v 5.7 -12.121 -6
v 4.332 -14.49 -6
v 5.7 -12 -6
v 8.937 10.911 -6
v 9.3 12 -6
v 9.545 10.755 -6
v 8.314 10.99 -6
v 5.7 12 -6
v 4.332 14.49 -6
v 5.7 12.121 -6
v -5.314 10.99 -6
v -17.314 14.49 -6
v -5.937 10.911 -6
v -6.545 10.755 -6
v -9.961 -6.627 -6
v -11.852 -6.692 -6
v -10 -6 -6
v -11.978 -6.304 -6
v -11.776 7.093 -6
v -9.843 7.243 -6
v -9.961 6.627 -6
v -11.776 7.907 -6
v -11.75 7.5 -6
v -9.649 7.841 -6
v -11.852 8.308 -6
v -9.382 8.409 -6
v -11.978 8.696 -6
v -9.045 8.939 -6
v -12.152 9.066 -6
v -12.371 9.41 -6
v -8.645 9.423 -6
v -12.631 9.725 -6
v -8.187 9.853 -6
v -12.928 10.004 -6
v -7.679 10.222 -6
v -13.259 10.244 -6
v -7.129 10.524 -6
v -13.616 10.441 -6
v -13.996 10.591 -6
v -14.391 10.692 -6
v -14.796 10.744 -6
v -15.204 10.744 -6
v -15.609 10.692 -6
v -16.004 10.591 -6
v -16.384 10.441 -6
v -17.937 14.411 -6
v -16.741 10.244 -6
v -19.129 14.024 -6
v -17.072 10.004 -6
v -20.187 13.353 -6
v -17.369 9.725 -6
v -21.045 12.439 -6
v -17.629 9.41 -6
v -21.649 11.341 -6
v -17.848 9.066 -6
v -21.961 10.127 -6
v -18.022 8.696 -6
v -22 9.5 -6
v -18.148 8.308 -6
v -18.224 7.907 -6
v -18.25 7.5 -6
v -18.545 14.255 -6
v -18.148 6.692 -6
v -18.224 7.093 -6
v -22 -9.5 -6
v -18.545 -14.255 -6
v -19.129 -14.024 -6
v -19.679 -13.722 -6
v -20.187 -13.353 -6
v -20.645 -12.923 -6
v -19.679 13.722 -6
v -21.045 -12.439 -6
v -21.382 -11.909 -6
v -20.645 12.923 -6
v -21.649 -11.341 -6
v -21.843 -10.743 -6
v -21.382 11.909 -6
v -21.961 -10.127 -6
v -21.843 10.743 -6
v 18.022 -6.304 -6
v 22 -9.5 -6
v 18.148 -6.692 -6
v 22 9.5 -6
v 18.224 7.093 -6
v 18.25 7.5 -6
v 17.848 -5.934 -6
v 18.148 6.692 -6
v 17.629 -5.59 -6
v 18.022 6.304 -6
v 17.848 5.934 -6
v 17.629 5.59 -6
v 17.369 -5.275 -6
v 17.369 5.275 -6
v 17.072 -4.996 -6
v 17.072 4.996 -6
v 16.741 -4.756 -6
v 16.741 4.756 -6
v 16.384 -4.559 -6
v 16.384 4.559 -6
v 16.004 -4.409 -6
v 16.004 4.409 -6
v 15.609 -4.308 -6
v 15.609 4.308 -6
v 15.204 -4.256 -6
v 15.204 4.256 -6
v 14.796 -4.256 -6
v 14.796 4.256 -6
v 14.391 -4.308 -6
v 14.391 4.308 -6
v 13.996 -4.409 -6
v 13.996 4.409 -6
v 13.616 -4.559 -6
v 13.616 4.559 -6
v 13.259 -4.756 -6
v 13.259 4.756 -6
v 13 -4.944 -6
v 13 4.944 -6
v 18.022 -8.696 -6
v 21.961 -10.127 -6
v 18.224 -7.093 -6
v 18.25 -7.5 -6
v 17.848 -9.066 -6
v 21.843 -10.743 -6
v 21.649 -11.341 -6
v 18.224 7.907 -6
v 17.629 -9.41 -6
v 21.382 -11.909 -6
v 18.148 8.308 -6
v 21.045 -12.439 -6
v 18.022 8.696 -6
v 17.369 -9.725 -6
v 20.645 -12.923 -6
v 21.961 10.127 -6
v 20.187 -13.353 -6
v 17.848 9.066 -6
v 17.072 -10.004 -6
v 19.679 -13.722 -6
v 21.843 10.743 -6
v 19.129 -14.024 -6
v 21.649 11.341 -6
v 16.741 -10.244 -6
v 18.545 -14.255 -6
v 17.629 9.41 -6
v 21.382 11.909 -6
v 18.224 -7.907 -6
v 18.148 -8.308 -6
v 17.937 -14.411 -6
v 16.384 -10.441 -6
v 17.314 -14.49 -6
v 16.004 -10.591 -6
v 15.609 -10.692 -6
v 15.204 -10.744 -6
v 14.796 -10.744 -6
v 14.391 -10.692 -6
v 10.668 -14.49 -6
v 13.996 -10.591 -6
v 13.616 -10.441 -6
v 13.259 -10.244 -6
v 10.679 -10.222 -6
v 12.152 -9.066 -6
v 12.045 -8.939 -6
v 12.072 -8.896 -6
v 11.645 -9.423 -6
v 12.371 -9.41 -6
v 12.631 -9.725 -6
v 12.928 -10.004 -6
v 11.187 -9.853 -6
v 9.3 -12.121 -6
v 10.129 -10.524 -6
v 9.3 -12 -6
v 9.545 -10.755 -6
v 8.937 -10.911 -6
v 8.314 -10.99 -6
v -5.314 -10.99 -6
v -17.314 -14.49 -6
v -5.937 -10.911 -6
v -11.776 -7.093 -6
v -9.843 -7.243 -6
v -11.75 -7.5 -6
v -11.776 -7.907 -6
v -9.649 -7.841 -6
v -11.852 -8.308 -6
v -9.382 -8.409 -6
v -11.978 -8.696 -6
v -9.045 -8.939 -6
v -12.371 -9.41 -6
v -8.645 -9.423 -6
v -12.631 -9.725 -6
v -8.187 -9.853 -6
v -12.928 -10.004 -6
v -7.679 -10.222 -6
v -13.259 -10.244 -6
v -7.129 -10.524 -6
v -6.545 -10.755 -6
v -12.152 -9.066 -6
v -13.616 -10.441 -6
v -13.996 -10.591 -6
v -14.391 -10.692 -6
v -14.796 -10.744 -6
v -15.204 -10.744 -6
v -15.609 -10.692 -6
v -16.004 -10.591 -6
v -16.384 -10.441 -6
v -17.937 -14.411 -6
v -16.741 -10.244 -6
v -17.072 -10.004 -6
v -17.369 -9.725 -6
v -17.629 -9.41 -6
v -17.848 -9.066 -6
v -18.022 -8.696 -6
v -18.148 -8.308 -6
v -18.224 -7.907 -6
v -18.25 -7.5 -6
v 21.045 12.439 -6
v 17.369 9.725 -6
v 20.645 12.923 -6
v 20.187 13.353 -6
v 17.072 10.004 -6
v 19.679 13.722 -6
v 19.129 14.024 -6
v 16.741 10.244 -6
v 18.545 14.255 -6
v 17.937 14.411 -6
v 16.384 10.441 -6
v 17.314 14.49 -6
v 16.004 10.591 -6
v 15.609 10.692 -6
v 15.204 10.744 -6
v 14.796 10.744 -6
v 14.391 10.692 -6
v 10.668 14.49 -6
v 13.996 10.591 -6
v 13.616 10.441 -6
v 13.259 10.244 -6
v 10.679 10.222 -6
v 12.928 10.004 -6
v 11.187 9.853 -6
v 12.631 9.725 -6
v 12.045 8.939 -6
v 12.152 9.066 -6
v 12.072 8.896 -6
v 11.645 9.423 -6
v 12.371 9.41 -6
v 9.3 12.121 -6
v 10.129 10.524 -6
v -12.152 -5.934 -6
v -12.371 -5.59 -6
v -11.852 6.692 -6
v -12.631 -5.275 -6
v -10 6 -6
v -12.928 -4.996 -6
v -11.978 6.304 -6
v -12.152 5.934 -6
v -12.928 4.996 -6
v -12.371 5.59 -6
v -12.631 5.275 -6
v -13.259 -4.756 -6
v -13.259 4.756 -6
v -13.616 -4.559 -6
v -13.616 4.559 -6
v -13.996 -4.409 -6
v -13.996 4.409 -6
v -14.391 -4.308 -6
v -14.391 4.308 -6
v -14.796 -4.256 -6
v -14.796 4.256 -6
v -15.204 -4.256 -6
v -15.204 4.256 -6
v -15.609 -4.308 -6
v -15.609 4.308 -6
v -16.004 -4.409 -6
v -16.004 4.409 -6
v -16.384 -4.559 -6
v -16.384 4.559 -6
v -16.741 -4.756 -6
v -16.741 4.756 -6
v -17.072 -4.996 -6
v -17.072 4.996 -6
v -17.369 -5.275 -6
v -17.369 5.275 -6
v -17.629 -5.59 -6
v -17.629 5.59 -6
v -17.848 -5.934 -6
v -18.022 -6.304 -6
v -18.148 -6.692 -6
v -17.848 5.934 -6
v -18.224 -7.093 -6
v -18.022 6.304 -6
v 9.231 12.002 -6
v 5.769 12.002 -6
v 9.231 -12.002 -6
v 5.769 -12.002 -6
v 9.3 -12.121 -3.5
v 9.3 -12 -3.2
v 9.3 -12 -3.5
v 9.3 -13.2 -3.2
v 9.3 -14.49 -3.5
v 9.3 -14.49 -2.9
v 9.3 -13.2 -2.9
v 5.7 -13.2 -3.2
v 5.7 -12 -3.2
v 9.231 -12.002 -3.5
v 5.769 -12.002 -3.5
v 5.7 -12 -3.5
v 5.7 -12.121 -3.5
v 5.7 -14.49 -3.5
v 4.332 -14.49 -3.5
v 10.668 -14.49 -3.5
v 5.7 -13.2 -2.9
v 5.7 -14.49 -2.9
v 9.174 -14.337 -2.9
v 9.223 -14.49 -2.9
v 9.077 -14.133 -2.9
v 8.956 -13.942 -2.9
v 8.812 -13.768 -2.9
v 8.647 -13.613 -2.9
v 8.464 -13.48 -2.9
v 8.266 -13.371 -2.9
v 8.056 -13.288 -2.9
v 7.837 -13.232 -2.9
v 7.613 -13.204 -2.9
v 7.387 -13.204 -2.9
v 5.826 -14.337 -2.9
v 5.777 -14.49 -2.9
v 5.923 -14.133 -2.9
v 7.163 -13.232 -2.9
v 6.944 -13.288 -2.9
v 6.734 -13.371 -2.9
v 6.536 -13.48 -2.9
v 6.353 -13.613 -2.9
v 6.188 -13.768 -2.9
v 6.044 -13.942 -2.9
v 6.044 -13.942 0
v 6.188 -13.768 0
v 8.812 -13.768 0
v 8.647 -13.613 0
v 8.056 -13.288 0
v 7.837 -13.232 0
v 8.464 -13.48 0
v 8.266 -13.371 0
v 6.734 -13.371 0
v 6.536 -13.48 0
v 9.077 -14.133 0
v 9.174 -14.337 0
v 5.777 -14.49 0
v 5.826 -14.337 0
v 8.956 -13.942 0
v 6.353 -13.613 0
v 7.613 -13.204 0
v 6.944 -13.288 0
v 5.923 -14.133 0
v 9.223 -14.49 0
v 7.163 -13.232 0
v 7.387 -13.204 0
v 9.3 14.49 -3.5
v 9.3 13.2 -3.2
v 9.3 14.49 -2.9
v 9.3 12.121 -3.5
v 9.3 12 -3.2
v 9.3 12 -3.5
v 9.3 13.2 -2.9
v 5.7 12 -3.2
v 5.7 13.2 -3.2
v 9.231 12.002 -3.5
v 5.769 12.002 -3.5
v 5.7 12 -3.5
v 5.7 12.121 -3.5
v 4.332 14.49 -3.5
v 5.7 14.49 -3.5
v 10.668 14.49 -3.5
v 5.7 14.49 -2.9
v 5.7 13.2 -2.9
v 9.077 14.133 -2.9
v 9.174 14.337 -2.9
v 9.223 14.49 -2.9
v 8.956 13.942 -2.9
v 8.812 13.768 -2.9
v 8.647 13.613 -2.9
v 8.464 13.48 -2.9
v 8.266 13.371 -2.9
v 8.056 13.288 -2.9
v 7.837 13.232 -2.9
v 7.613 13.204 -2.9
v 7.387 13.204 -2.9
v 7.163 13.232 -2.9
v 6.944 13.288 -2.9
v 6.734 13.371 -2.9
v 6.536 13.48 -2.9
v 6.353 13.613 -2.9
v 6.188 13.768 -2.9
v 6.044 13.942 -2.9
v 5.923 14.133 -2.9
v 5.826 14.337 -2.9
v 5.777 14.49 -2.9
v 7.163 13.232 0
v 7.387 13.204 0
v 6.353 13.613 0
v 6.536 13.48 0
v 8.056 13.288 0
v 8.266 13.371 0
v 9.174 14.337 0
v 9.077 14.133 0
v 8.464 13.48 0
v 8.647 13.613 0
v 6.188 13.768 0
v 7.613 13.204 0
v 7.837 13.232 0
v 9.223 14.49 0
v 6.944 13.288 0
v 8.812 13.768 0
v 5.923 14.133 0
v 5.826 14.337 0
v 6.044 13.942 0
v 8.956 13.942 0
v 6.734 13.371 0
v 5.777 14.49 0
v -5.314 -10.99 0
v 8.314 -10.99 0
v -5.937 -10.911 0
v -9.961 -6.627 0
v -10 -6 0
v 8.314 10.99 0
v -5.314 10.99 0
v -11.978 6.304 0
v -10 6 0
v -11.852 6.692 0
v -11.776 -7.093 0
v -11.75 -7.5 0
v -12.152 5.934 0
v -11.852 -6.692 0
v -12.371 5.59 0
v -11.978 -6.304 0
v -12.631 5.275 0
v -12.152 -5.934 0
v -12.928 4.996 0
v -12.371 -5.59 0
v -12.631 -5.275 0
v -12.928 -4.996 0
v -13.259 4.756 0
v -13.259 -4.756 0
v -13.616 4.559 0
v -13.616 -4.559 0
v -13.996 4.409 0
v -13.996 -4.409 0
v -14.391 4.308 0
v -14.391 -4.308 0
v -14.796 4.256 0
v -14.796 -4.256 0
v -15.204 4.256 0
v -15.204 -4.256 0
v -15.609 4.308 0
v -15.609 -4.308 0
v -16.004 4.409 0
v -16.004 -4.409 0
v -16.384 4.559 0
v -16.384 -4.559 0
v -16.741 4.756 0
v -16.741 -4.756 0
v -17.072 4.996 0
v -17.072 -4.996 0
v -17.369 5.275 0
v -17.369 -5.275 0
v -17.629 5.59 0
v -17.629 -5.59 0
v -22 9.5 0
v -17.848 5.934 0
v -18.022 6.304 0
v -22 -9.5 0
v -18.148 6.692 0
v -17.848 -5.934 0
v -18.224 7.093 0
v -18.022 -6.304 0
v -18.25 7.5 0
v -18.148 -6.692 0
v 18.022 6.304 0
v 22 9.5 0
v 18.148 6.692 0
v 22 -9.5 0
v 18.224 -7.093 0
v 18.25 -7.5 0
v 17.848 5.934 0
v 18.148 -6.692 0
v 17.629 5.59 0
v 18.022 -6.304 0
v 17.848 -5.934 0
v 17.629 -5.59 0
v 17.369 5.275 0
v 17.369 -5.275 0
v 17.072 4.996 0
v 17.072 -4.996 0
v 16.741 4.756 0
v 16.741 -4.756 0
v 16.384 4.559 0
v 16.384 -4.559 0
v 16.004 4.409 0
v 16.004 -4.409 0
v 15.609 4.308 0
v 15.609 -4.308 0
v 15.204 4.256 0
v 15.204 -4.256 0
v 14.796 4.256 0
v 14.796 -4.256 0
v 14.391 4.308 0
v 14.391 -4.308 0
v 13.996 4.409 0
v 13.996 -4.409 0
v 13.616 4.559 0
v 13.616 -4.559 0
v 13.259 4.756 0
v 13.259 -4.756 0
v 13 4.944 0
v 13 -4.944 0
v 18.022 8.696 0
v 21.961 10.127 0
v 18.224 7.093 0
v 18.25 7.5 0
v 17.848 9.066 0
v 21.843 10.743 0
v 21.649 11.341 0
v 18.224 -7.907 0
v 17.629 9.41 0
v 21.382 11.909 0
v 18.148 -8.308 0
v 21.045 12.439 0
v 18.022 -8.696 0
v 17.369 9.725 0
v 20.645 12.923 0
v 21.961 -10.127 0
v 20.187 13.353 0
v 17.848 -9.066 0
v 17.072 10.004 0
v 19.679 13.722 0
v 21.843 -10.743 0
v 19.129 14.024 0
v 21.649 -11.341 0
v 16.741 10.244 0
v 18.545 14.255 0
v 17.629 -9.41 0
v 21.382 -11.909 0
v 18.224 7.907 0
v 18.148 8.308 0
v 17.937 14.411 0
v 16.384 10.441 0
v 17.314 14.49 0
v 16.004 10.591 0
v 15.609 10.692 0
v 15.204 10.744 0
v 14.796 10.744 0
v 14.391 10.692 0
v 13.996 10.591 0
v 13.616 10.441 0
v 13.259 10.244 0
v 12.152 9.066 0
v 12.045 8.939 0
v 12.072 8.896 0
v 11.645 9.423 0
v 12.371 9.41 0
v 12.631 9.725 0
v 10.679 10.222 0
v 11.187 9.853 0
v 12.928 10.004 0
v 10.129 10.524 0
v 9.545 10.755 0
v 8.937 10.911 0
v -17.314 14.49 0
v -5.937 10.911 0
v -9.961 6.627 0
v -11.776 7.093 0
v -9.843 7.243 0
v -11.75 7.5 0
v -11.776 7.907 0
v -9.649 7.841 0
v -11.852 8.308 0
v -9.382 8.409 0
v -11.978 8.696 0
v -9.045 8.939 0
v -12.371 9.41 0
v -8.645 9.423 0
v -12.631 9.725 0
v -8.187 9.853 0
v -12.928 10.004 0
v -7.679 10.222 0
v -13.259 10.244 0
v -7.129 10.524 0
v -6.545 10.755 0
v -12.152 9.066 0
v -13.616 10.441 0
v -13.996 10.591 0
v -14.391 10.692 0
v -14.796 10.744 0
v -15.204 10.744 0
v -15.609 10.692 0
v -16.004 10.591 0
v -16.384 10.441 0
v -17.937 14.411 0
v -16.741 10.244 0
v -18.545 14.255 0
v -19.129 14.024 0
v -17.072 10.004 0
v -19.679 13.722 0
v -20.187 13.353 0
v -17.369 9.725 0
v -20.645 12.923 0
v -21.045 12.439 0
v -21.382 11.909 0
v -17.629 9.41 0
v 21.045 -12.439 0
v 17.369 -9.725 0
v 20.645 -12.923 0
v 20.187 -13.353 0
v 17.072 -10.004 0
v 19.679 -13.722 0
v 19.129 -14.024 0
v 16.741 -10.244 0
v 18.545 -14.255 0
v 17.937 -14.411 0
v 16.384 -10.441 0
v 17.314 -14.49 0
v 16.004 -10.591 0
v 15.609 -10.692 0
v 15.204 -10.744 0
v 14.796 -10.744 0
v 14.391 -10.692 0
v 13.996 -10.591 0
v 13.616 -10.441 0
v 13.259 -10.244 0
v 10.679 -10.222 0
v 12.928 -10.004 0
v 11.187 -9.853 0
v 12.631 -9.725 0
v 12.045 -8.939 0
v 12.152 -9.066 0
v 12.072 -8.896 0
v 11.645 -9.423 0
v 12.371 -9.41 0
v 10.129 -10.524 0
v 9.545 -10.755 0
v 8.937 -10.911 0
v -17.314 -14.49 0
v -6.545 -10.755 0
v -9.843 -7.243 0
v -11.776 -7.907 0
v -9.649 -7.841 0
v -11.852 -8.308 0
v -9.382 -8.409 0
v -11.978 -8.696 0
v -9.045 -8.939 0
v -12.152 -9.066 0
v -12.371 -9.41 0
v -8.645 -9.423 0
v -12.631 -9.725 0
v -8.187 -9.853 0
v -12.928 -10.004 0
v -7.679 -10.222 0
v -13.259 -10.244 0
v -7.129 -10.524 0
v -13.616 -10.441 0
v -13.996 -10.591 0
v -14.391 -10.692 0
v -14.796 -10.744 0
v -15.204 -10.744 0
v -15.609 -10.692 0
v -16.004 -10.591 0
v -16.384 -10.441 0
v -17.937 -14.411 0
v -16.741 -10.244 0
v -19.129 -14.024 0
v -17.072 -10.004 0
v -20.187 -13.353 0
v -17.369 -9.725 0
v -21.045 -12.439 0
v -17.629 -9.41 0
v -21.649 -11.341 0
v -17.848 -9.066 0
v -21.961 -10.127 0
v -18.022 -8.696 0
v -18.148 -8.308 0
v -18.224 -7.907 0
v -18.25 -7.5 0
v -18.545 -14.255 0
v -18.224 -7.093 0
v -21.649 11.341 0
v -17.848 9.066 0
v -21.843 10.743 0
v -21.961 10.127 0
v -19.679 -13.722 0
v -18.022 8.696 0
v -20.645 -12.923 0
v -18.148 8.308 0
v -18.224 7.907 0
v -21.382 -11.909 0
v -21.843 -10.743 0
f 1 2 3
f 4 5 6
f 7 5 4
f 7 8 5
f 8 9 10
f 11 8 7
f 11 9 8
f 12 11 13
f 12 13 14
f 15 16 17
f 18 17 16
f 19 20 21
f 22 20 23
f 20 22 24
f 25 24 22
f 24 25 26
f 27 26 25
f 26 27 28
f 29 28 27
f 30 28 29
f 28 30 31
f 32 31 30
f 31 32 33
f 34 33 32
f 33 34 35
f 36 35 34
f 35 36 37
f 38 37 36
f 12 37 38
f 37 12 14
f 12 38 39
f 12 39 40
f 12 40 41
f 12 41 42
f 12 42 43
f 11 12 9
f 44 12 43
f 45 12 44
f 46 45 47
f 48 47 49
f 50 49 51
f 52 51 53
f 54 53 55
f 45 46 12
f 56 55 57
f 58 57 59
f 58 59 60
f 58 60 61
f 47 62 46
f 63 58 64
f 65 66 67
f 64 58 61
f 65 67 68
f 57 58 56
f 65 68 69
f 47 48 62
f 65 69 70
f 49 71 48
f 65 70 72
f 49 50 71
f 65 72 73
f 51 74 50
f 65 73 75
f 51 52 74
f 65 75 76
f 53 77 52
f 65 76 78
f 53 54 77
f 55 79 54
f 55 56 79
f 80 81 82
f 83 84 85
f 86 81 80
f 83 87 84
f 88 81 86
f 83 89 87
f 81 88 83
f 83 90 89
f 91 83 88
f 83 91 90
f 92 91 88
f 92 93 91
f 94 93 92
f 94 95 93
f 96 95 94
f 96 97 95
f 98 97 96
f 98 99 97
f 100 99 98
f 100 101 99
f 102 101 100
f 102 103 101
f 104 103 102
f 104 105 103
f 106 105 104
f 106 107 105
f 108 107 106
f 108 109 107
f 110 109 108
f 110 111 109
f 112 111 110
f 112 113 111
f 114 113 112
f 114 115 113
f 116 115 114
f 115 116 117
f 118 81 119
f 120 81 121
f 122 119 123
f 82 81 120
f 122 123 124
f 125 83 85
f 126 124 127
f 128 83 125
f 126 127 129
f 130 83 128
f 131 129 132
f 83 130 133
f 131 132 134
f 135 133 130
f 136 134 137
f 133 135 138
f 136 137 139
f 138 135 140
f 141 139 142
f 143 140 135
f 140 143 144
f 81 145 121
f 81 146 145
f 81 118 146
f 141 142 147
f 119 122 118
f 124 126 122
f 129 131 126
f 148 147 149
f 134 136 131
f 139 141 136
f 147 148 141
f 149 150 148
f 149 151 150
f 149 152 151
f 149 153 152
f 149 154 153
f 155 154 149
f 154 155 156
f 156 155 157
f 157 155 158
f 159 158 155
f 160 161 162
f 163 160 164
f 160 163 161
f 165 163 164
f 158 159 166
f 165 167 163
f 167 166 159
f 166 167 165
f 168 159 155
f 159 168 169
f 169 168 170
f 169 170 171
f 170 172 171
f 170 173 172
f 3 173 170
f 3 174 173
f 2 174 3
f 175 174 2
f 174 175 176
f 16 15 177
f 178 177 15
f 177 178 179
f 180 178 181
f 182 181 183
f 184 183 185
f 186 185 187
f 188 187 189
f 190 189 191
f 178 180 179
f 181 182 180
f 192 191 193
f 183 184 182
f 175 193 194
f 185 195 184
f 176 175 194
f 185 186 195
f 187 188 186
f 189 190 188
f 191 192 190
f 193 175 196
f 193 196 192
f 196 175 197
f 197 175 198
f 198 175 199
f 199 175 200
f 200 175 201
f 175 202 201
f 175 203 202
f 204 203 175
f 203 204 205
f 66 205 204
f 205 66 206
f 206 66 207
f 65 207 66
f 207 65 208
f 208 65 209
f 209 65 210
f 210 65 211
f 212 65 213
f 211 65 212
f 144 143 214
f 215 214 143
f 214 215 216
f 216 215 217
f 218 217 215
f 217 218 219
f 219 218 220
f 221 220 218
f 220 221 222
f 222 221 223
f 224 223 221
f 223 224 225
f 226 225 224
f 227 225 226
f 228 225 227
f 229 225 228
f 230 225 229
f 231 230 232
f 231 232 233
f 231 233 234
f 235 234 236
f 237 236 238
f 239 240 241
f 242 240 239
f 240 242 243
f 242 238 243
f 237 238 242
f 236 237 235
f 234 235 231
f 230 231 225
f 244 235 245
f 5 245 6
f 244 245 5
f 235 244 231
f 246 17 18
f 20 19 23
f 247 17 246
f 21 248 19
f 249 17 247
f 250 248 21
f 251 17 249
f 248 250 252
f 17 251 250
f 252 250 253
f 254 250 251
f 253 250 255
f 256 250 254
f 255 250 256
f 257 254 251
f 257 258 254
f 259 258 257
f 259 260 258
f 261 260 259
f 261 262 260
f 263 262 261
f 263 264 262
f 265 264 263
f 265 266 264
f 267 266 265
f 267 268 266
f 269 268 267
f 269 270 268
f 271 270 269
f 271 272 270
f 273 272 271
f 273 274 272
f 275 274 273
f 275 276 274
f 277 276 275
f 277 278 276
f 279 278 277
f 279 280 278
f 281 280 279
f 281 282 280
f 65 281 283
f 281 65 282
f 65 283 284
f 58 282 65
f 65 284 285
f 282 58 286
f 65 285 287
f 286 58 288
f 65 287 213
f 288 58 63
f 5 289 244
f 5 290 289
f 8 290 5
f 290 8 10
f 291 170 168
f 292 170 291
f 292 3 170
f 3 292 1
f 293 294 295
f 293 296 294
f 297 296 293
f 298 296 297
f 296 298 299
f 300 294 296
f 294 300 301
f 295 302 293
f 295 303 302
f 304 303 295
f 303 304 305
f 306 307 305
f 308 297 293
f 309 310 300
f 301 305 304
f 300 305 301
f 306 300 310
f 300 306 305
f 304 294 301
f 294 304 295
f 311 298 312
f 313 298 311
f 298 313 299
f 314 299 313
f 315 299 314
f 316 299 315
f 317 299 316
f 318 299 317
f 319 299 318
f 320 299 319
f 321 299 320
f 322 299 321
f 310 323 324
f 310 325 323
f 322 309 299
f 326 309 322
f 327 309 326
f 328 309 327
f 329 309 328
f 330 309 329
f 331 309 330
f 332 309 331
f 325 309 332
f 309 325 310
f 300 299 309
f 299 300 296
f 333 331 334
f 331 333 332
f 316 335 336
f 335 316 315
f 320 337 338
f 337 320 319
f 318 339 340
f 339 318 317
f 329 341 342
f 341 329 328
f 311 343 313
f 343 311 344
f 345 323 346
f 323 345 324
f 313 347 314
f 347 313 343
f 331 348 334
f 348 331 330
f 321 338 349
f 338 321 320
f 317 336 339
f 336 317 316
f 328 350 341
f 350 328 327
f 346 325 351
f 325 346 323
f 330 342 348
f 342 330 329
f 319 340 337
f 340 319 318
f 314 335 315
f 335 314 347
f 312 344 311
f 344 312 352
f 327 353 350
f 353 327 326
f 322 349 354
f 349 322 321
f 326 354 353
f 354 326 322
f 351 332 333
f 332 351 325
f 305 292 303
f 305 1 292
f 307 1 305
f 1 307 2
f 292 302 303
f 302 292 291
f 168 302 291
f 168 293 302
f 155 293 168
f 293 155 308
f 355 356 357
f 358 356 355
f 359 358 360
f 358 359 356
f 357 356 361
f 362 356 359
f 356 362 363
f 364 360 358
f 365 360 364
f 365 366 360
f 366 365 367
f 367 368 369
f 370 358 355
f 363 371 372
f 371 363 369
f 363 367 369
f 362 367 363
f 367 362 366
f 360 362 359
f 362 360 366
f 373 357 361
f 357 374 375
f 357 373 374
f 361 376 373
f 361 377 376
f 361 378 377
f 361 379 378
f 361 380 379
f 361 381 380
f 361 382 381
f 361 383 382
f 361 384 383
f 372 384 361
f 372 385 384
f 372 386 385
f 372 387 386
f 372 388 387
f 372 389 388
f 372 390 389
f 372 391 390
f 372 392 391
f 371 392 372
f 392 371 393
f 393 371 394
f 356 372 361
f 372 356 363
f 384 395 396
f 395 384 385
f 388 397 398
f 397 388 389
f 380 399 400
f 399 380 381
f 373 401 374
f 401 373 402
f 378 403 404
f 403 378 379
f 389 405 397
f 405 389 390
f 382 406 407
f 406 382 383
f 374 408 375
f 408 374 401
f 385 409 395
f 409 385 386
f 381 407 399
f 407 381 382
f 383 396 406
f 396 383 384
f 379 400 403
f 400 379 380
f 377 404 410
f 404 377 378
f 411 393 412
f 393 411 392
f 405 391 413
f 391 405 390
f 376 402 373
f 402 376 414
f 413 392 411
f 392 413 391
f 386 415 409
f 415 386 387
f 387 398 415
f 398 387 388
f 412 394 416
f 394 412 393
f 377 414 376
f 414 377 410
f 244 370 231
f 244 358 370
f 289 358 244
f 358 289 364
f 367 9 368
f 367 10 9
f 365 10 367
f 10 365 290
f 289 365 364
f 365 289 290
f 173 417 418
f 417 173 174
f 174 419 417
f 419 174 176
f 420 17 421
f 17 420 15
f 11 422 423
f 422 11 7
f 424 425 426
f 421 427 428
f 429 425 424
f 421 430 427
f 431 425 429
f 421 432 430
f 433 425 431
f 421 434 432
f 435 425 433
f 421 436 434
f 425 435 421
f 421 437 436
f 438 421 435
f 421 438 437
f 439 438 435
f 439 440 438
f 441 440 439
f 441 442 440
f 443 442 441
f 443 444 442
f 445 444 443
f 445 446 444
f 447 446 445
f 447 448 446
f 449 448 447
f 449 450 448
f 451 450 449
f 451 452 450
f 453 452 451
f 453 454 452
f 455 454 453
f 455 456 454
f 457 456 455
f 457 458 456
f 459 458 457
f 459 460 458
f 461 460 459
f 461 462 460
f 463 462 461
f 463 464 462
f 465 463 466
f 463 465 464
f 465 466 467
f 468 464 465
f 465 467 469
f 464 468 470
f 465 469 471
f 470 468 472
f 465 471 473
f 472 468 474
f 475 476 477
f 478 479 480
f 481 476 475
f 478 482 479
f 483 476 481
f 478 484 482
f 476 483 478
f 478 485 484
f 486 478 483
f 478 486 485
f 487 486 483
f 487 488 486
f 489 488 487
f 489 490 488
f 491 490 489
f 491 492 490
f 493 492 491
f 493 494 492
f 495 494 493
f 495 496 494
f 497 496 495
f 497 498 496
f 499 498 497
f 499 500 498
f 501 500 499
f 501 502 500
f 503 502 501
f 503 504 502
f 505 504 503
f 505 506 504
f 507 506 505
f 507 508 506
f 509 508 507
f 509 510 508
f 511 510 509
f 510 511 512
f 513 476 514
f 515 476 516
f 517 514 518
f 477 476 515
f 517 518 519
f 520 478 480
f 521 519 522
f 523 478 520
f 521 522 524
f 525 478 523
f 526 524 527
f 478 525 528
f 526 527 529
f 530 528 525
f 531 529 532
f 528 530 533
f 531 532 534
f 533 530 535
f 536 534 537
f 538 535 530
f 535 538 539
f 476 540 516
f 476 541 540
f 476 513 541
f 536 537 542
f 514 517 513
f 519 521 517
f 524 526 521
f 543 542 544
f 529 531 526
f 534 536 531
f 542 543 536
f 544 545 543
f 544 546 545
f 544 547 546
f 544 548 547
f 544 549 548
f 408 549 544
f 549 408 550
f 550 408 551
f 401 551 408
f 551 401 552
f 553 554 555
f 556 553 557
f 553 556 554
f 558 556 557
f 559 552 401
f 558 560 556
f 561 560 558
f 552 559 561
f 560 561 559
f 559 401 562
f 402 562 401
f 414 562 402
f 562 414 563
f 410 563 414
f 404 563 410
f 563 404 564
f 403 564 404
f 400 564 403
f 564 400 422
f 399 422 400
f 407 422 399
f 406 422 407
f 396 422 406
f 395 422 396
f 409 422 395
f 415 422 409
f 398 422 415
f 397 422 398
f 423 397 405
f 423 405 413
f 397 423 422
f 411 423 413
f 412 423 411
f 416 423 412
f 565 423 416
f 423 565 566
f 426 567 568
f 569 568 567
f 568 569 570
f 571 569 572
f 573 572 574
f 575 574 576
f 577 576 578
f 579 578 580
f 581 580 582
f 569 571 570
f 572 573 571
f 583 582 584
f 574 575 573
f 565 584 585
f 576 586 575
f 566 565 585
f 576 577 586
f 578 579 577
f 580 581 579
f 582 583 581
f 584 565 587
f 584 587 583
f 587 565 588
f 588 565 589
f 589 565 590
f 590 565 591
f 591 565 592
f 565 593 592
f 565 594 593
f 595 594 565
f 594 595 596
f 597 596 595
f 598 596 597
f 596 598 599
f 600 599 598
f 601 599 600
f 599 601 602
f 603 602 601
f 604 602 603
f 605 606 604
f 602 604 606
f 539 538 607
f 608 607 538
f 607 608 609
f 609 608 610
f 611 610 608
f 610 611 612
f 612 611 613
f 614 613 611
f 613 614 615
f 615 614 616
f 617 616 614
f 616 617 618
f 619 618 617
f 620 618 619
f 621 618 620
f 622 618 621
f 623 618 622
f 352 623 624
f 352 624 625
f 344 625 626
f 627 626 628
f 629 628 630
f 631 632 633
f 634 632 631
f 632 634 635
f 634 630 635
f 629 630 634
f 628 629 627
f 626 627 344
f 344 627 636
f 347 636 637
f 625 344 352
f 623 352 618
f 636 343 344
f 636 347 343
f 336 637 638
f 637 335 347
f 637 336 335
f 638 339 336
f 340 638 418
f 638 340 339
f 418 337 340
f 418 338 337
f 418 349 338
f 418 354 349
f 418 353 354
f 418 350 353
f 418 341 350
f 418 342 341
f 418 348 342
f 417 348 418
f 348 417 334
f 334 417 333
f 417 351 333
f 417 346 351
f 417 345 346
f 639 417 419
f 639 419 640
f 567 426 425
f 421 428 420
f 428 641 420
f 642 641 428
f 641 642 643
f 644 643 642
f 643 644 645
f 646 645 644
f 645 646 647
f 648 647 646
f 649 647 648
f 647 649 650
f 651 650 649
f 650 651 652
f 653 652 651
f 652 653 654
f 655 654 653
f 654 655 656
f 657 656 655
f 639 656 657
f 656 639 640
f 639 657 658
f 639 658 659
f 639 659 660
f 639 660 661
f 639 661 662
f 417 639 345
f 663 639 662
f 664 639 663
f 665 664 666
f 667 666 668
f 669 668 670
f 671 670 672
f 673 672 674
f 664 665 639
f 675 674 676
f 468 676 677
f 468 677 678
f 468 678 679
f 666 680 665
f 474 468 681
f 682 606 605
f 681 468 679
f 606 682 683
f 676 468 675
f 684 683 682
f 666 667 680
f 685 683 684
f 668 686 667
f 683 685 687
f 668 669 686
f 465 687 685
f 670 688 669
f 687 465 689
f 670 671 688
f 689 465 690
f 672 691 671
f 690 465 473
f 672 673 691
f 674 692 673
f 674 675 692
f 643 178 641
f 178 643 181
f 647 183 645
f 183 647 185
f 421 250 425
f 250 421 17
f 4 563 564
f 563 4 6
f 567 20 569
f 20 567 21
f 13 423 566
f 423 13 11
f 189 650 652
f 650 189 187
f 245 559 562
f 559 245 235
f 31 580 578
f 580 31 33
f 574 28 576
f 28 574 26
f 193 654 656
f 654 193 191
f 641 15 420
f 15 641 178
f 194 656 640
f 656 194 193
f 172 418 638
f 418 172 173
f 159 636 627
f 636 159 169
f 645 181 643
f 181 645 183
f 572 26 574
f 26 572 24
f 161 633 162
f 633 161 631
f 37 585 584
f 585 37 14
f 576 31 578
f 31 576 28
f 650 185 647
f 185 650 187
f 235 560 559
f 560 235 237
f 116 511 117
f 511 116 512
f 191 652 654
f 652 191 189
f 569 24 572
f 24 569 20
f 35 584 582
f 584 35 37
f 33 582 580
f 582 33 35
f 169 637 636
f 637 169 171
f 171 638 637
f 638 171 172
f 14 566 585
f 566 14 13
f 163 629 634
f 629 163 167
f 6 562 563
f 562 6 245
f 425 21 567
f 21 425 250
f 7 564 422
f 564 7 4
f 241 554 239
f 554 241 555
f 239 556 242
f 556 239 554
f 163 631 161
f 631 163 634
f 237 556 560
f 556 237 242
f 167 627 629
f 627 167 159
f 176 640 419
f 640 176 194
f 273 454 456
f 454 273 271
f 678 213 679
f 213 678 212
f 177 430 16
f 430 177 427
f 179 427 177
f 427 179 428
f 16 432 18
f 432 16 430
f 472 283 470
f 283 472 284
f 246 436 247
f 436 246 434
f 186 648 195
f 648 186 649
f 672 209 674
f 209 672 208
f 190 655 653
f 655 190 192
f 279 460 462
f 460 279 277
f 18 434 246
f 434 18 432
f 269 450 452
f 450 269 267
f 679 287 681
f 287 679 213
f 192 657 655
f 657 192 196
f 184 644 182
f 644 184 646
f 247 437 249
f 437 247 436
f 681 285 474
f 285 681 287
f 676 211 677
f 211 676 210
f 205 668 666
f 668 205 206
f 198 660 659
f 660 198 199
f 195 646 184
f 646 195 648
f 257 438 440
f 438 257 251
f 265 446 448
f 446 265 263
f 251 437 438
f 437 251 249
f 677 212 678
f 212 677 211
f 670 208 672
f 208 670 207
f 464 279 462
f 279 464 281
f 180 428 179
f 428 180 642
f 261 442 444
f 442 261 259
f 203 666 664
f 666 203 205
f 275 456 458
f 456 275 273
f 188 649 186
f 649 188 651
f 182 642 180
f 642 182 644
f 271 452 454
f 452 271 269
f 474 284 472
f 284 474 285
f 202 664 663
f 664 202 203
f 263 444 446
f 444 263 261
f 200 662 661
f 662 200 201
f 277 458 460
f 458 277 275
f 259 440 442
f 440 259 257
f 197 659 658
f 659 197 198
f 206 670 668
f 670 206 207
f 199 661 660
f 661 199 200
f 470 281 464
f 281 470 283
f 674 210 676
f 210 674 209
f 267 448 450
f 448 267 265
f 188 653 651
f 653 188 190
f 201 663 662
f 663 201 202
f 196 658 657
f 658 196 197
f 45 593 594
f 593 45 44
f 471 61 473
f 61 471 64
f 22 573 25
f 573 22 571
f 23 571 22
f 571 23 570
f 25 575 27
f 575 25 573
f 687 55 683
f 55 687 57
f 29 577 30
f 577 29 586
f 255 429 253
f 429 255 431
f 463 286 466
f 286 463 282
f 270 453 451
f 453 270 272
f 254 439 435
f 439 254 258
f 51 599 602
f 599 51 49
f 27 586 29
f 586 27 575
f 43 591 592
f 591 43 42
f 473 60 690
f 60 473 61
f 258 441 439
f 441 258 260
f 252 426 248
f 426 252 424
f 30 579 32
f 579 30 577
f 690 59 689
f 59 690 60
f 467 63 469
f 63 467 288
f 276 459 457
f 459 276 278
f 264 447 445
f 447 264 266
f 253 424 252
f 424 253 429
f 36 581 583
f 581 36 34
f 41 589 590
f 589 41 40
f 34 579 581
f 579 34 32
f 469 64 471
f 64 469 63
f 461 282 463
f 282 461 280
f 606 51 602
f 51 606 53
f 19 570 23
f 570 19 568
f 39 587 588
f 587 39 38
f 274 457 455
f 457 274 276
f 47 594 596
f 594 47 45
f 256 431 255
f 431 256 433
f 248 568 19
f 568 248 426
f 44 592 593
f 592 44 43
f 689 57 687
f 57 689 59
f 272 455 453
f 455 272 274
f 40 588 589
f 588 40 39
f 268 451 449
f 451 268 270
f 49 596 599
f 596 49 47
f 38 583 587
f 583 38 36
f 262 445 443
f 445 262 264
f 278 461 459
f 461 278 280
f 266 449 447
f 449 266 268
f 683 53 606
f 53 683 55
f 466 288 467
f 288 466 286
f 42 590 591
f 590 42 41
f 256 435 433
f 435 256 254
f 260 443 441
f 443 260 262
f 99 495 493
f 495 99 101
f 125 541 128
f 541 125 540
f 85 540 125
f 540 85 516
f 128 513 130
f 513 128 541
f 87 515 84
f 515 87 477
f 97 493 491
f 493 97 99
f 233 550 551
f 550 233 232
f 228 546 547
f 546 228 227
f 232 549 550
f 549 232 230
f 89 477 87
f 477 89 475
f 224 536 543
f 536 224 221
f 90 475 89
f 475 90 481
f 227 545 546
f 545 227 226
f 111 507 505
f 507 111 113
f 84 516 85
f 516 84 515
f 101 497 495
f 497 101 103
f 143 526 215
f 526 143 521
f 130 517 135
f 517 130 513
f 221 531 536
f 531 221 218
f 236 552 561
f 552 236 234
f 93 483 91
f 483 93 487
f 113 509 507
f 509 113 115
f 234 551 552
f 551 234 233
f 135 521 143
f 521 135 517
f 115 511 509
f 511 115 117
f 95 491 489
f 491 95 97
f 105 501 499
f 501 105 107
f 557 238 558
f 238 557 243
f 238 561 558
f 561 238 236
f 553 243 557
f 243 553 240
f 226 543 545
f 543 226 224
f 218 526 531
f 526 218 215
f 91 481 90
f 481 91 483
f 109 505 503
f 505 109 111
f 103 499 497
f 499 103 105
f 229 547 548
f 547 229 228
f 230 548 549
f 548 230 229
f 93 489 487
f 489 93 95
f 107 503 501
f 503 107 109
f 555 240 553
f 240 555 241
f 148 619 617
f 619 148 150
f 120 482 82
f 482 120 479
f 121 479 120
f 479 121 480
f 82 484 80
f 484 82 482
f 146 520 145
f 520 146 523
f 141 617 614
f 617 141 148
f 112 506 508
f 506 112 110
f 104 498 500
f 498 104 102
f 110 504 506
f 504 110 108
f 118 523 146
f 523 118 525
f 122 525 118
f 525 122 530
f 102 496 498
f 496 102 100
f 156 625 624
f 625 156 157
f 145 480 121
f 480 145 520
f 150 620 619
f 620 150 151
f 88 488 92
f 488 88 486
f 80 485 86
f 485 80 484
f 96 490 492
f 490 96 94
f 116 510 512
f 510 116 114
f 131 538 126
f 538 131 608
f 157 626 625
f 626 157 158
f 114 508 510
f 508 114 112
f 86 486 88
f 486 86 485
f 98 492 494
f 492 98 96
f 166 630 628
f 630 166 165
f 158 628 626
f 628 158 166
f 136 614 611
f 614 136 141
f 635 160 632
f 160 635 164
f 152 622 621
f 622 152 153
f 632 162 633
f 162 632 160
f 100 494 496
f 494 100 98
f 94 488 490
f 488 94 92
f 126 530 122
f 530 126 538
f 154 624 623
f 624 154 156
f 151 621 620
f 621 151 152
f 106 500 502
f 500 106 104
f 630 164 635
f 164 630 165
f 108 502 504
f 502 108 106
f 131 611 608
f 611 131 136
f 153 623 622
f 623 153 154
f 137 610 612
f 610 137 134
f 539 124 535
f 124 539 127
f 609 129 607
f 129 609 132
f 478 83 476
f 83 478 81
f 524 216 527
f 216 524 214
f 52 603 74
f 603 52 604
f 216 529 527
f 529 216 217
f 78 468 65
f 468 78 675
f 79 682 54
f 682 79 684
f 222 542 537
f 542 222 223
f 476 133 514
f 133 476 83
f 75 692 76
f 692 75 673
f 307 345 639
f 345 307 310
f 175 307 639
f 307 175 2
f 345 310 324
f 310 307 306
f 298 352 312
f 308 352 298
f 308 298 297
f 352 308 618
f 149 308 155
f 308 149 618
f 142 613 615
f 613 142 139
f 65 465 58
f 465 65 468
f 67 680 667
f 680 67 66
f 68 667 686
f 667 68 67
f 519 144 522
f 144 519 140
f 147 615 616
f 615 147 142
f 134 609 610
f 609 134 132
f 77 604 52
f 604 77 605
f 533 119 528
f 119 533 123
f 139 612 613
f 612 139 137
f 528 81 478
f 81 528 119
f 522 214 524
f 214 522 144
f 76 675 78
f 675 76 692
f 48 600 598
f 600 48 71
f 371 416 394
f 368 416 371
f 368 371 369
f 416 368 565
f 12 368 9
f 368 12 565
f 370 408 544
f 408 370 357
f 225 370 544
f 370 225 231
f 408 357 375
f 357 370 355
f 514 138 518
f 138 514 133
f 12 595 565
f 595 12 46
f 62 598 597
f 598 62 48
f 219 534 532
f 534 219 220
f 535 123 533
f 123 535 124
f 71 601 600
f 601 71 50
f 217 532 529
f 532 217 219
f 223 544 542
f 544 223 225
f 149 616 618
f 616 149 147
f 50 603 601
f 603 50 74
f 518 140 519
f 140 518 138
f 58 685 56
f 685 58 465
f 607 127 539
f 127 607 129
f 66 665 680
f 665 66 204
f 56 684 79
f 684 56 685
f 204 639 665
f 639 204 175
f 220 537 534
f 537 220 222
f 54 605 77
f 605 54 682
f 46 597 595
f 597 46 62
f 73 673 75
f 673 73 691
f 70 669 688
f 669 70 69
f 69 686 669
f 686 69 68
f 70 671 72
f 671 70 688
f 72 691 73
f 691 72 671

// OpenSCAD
$fn = 50;


difference() {
	union() {
		*color(alpha = 1.0000000000, c = "gray") {
			translate(v = [0, 14, -6]) {
				linear_extrude(height = 2) {
					text(font = "Arial:style=Bold", halign = "center", size = 4.5000000000, text = "COMMENT description oobb_plate_shape_positive_type_6_depth_0_0_-6_pos_spacer_extra_6_thickness_3_width_2_height_0_0_-6_pos_plate", valign = "center");
				}
			}
		}
		translate(v = [0, 0, -6]) {
			hull() {
				translate(v = [-17.0000000000, 9.5000000000, 0]) {
					cylinder(h = 6, r = 5);
				}
				translate(v = [17.0000000000, 9.5000000000, 0]) {
					cylinder(h = 6, r = 5);
				}
				translate(v = [-17.0000000000, -9.5000000000, 0]) {
					cylinder(h = 6, r = 5);
				}
				translate(v = [17.0000000000, -9.5000000000, 0]) {
					cylinder(h = 6, r = 5);
				}
			}
		}
		*color(alpha = 1.0000000000, c = "gray") {
			translate(v = [0, 14, -6]) {
				linear_extrude(height = 2) {
					text(font = "Arial:style=Bold", halign = "center", size = 4.5000000000, text = "COMMENT description oobb_holes_shape_p_type_0_0_-6_pos_spacer_extra_6_thickness_3_width_2_height_0_0_-6_pos_plate_'left'_'right'_'top'_hole_sides_'left'_'right'_'top'_holes_true_both_holes", valign = "center");
				}
			}
		}
		*color(alpha = 1.0000000000, c = "gray") {
			translate(v = [0, 14, -3]) {
				rotate(a = [0, 0, 180]) {
					linear_extrude(height = 2) {
						text(font = "Arial:style=Bold", halign = "center", size = 4.5000000000, text = "COMMENT description oobb_wire_spacer_shape_0_0_-3_pos_spacer_extra_6_thickness_3_width_2_height_0_0_-6_pos_plate_0_0_180_rot", valign = "center");
					}
				}
			}
		}
	}
	union() {
		translate(v = [7.5000000000, -15, -6]) {
			rotate(a = [0, 0, 0]) {
				difference() {
					union() {
						#translate(v = [-1.8000000000, -3.0000000000, -0.3000000000]) {
							cube(size = [3.6000000000, 6.0000000000, 0.3000000000]);
						}
						#translate(v = [-1.8000000000, -1.8000000000, -0.6000000000]) {
							cube(size = [3.6000000000, 3.6000000000, 0.3000000000]);
						}
						#translate(v = [-1.8000000000, -3.0000000000, 2.5000000000]) {
							cube(size = [3.6000000000, 6.0000000000, 0.3000000000]);
						}
						#translate(v = [-1.8000000000, -1.8000000000, 2.8000000000]) {
							cube(size = [3.6000000000, 3.6000000000, 0.3000000000]);
						}
						#translate(v = [0, 0, -50.0000000000]) {
							cylinder(h = 100, r = 1.8000000000);
						}
						#linear_extrude(height = 2.5000000000) {
							polygon(points = [[3.4620000000, 0.0000000000], [1.7310000000, 2.9981799479], [-1.7310000000, 2.9981799479], [-3.4620000000, 0.0000000000], [-1.7310000000, -2.9981799479], [1.7310000000, -2.9981799479]]);
						}
						#translate(v = [-1.8000000000, -3.0000000000, -0.3000000000]) {
							cube(size = [3.6000000000, 6.0000000000, 0.3000000000]);
						}
						#translate(v = [-1.8000000000, -1.8000000000, -0.6000000000]) {
							cube(size = [3.6000000000, 3.6000000000, 0.3000000000]);
						}
						#translate(v = [-1.8000000000, -3.0000000000, 2.5000000000]) {
							cube(size = [3.6000000000, 6.0000000000, 0.3000000000]);
						}
						#translate(v = [-1.8000000000, -1.8000000000, 2.8000000000]) {
							cube(size = [3.6000000000, 3.6000000000, 0.3000000000]);
						}
						#translate(v = [0, 0, -50.0000000000]) {
							cylinder(h = 100, r = 1.8000000000);
						}
						#translate(v = [-1.8000000000, -3.0000000000, -0.3000000000]) {
							cube(size = [3.6000000000, 6.0000000000, 0.3000000000]);
						}
						#translate(v = [-1.8000000000, -1.8000000000, -0.6000000000]) {
							cube(size = [3.6000000000, 3.6000000000, 0.3000000000]);
						}
						#translate(v = [-1.8000000000, -3.0000000000, 2.5000000000]) {
							cube(size = [3.6000000000, 6.0000000000, 0.3000000000]);
						}
						#translate(v = [-1.8000000000, -1.8000000000, 2.8000000000]) {
							cube(size = [3.6000000000, 3.6000000000, 0.3000000000]);
						}
						#translate(v = [0, 0, -50.0000000000]) {
							cylinder(h = 100, r = 1.8000000000);
						}
					}
					union();
				}
			}
		}
		translate(v = [7.5000000000, 15, -6]) {
			rotate(a = [0, 0, 0]) {
				difference() {
					union() {
						#translate(v = [-1.8000000000, -3.0000000000, -0.3000000000]) {
							cube(size = [3.6000000000, 6.0000000000, 0.3000000000]);
						}
						#translate(v = [-1.8000000000, -1.8000000000, -0.6000000000]) {
							cube(size = [3.6000000000, 3.6000000000, 0.3000000000]);
						}
						#translate(v = [-1.8000000000, -3.0000000000, 2.5000000000]) {
							cube(size = [3.6000000000, 6.0000000000, 0.3000000000]);
						}
						#translate(v = [-1.8000000000, -1.8000000000, 2.8000000000]) {
							cube(size = [3.6000000000, 3.6000000000, 0.3000000000]);
						}
						#translate(v = [0, 0, -50.0000000000]) {
							cylinder(h = 100, r = 1.8000000000);
						}
						#linear_extrude(height = 2.5000000000) {
							polygon(points = [[3.4620000000, 0.0000000000], [1.7310000000, 2.9981799479], [-1.7310000000, 2.9981799479], [-3.4620000000, 0.0000000000], [-1.7310000000, -2.9981799479], [1.7310000000, -2.9981799479]]);
						}
						#translate(v = [-1.8000000000, -3.0000000000, -0.3000000000]) {
							cube(size = [3.6000000000, 6.0000000000, 0.3000000000]);
						}
						#translate(v = [-1.8000000000, -1.8000000000, -0.6000000000]) {
							cube(size = [3.6000000000, 3.6000000000, 0.3000000000]);
						}
						#translate(v = [-1.8000000000, -3.0000000000, 2.5000000000]) {
							cube(size = [3.6000000000, 6.0000000000, 0.3000000000]);
						}
						#translate(v = [-1.8000000000, -1.8000000000, 2.8000000000]) {
							cube(size = [3.6000000000, 3.6000000000, 0.3000000000]);
						}
						#translate(v = [0, 0, -50.0000000000]) {
							cylinder(h = 100, r = 1.8000000000);
						}
						#translate(v = [-1.8000000000, -3.0000000000, -0.3000000000]) {
							cube(size = [3.6000000000, 6.0000000000, 0.3000000000]);
						}
						#translate(v = [-1.8000000000, -1.8000000000, -0.6000000000]) {
							cube(size = [3.6000000000, 3.6000000000, 0.3000000000]);
						}
						#translate(v = [-1.8000000000, -3.0000000000, 2.5000000000]) {
							cube(size = [3.6000000000, 6.0000000000, 0.3000000000]);
						}
						#translate(v = [-1.8000000000, -1.8000000000, 2.8000000000]) {
							cube(size = [3.6000000000, 3.6000000000, 0.3000000000]);
						}
						#translate(v = [0, 0, -50.0000000000]) {
							cylinder(h = 100, r = 1.8000000000);
						}
					}
					union();
				}
			}
		}
		translate(v = [0, 0, -3]) {
			rotate(a = [0, 0, 180]) {
				difference() {
					union() {
						translate(v = [-1.5000000000, 0, -3]) {
							hull() {
								translate(v = [-6.5000000000, 6.0000000000, 0]) {
									cylinder(h = 6, r = 5);
								}
								translate(v = [6.5000000000, 6.0000000000, 0]) {
									cylinder(h = 6, r = 5);
								}
								translate(v = [-6.5000000000, -6.0000000000, 0]) {
									cylinder(h = 6, r = 5);
								}
								translate(v = [6.5000000000, -6.0000000000, 0]) {
									cylinder(h = 6, r = 5);
								}
							}
						}
					}
					union();
				}
			}
		}
		translate(v = [-15.0000000000, -7.5000000000, -50.0000000000]) {
			cylinder(h = 100, r = 3.2500000000);
		}
		translate(v = [-15.0000000000, 7.5000000000, -50.0000000000]) {
			cylinder(h = 100, r = 3.2500000000);
		}
		translate(v = [-15.0000000000, 7.5000000000, -50.0000000000]) {
			cylinder(h = 100, r = 3.2500000000);
		}
		translate(v = [0.0000000000, 7.5000000000, -50.0000000000]) {
			cylinder(h = 100, r = 3.2500000000);
		}
		translate(v = [15.0000000000, 7.5000000000, -50.0000000000]) {
			cylinder(h = 100, r = 3.2500000000);
		}
		translate(v = [-15.0000000000, -7.5000000000, -50.0000000000]) {
			cylinder(h = 100, r = 3.2500000000);
		}
		translate(v = [0.0000000000, -7.5000000000, -50.0000000000]) {
			cylinder(h = 100, r = 3.2500000000);
		}
		translate(v = [15.0000000000, -7.5000000000, -50.0000000000]) {
			cylinder(h = 100, r = 3.2500000000);
		}
		*color(alpha = 1.0000000000, c = "gray") {
			translate(v = [7.5000000000, -1, -6]) {
				linear_extrude(height = 2) {
					text(font = "Arial:style=Bold", halign = "center", size = 4.5000000000, text = "COMMENT description oobb_nut_shape_negative_type_m3_radius_name_7.5_-15_-6_pos_6_thickness_3_width_2_height_0_0_-6_pos_plate_bottom_zz_true_overhang_0_0_0_rot_false_nut_true_hole", valign = "center");
				}
			}
		}
		*color(alpha = 1.0000000000, c = "gray") {
			translate(v = [7.5000000000, 29, -6]) {
				linear_extrude(height = 2) {
					text(font = "Arial:style=Bold", halign = "center", size = 4.5000000000, text = "COMMENT description oobb_nut_shape_negative_type_m3_radius_name_7.5_15_-6_pos_6_thickness_3_width_2_height_0_0_-6_pos_plate_bottom_zz_true_overhang_0_0_0_rot_false_nut_true_hole", valign = "center");
				}
			}
		}
	}
}
